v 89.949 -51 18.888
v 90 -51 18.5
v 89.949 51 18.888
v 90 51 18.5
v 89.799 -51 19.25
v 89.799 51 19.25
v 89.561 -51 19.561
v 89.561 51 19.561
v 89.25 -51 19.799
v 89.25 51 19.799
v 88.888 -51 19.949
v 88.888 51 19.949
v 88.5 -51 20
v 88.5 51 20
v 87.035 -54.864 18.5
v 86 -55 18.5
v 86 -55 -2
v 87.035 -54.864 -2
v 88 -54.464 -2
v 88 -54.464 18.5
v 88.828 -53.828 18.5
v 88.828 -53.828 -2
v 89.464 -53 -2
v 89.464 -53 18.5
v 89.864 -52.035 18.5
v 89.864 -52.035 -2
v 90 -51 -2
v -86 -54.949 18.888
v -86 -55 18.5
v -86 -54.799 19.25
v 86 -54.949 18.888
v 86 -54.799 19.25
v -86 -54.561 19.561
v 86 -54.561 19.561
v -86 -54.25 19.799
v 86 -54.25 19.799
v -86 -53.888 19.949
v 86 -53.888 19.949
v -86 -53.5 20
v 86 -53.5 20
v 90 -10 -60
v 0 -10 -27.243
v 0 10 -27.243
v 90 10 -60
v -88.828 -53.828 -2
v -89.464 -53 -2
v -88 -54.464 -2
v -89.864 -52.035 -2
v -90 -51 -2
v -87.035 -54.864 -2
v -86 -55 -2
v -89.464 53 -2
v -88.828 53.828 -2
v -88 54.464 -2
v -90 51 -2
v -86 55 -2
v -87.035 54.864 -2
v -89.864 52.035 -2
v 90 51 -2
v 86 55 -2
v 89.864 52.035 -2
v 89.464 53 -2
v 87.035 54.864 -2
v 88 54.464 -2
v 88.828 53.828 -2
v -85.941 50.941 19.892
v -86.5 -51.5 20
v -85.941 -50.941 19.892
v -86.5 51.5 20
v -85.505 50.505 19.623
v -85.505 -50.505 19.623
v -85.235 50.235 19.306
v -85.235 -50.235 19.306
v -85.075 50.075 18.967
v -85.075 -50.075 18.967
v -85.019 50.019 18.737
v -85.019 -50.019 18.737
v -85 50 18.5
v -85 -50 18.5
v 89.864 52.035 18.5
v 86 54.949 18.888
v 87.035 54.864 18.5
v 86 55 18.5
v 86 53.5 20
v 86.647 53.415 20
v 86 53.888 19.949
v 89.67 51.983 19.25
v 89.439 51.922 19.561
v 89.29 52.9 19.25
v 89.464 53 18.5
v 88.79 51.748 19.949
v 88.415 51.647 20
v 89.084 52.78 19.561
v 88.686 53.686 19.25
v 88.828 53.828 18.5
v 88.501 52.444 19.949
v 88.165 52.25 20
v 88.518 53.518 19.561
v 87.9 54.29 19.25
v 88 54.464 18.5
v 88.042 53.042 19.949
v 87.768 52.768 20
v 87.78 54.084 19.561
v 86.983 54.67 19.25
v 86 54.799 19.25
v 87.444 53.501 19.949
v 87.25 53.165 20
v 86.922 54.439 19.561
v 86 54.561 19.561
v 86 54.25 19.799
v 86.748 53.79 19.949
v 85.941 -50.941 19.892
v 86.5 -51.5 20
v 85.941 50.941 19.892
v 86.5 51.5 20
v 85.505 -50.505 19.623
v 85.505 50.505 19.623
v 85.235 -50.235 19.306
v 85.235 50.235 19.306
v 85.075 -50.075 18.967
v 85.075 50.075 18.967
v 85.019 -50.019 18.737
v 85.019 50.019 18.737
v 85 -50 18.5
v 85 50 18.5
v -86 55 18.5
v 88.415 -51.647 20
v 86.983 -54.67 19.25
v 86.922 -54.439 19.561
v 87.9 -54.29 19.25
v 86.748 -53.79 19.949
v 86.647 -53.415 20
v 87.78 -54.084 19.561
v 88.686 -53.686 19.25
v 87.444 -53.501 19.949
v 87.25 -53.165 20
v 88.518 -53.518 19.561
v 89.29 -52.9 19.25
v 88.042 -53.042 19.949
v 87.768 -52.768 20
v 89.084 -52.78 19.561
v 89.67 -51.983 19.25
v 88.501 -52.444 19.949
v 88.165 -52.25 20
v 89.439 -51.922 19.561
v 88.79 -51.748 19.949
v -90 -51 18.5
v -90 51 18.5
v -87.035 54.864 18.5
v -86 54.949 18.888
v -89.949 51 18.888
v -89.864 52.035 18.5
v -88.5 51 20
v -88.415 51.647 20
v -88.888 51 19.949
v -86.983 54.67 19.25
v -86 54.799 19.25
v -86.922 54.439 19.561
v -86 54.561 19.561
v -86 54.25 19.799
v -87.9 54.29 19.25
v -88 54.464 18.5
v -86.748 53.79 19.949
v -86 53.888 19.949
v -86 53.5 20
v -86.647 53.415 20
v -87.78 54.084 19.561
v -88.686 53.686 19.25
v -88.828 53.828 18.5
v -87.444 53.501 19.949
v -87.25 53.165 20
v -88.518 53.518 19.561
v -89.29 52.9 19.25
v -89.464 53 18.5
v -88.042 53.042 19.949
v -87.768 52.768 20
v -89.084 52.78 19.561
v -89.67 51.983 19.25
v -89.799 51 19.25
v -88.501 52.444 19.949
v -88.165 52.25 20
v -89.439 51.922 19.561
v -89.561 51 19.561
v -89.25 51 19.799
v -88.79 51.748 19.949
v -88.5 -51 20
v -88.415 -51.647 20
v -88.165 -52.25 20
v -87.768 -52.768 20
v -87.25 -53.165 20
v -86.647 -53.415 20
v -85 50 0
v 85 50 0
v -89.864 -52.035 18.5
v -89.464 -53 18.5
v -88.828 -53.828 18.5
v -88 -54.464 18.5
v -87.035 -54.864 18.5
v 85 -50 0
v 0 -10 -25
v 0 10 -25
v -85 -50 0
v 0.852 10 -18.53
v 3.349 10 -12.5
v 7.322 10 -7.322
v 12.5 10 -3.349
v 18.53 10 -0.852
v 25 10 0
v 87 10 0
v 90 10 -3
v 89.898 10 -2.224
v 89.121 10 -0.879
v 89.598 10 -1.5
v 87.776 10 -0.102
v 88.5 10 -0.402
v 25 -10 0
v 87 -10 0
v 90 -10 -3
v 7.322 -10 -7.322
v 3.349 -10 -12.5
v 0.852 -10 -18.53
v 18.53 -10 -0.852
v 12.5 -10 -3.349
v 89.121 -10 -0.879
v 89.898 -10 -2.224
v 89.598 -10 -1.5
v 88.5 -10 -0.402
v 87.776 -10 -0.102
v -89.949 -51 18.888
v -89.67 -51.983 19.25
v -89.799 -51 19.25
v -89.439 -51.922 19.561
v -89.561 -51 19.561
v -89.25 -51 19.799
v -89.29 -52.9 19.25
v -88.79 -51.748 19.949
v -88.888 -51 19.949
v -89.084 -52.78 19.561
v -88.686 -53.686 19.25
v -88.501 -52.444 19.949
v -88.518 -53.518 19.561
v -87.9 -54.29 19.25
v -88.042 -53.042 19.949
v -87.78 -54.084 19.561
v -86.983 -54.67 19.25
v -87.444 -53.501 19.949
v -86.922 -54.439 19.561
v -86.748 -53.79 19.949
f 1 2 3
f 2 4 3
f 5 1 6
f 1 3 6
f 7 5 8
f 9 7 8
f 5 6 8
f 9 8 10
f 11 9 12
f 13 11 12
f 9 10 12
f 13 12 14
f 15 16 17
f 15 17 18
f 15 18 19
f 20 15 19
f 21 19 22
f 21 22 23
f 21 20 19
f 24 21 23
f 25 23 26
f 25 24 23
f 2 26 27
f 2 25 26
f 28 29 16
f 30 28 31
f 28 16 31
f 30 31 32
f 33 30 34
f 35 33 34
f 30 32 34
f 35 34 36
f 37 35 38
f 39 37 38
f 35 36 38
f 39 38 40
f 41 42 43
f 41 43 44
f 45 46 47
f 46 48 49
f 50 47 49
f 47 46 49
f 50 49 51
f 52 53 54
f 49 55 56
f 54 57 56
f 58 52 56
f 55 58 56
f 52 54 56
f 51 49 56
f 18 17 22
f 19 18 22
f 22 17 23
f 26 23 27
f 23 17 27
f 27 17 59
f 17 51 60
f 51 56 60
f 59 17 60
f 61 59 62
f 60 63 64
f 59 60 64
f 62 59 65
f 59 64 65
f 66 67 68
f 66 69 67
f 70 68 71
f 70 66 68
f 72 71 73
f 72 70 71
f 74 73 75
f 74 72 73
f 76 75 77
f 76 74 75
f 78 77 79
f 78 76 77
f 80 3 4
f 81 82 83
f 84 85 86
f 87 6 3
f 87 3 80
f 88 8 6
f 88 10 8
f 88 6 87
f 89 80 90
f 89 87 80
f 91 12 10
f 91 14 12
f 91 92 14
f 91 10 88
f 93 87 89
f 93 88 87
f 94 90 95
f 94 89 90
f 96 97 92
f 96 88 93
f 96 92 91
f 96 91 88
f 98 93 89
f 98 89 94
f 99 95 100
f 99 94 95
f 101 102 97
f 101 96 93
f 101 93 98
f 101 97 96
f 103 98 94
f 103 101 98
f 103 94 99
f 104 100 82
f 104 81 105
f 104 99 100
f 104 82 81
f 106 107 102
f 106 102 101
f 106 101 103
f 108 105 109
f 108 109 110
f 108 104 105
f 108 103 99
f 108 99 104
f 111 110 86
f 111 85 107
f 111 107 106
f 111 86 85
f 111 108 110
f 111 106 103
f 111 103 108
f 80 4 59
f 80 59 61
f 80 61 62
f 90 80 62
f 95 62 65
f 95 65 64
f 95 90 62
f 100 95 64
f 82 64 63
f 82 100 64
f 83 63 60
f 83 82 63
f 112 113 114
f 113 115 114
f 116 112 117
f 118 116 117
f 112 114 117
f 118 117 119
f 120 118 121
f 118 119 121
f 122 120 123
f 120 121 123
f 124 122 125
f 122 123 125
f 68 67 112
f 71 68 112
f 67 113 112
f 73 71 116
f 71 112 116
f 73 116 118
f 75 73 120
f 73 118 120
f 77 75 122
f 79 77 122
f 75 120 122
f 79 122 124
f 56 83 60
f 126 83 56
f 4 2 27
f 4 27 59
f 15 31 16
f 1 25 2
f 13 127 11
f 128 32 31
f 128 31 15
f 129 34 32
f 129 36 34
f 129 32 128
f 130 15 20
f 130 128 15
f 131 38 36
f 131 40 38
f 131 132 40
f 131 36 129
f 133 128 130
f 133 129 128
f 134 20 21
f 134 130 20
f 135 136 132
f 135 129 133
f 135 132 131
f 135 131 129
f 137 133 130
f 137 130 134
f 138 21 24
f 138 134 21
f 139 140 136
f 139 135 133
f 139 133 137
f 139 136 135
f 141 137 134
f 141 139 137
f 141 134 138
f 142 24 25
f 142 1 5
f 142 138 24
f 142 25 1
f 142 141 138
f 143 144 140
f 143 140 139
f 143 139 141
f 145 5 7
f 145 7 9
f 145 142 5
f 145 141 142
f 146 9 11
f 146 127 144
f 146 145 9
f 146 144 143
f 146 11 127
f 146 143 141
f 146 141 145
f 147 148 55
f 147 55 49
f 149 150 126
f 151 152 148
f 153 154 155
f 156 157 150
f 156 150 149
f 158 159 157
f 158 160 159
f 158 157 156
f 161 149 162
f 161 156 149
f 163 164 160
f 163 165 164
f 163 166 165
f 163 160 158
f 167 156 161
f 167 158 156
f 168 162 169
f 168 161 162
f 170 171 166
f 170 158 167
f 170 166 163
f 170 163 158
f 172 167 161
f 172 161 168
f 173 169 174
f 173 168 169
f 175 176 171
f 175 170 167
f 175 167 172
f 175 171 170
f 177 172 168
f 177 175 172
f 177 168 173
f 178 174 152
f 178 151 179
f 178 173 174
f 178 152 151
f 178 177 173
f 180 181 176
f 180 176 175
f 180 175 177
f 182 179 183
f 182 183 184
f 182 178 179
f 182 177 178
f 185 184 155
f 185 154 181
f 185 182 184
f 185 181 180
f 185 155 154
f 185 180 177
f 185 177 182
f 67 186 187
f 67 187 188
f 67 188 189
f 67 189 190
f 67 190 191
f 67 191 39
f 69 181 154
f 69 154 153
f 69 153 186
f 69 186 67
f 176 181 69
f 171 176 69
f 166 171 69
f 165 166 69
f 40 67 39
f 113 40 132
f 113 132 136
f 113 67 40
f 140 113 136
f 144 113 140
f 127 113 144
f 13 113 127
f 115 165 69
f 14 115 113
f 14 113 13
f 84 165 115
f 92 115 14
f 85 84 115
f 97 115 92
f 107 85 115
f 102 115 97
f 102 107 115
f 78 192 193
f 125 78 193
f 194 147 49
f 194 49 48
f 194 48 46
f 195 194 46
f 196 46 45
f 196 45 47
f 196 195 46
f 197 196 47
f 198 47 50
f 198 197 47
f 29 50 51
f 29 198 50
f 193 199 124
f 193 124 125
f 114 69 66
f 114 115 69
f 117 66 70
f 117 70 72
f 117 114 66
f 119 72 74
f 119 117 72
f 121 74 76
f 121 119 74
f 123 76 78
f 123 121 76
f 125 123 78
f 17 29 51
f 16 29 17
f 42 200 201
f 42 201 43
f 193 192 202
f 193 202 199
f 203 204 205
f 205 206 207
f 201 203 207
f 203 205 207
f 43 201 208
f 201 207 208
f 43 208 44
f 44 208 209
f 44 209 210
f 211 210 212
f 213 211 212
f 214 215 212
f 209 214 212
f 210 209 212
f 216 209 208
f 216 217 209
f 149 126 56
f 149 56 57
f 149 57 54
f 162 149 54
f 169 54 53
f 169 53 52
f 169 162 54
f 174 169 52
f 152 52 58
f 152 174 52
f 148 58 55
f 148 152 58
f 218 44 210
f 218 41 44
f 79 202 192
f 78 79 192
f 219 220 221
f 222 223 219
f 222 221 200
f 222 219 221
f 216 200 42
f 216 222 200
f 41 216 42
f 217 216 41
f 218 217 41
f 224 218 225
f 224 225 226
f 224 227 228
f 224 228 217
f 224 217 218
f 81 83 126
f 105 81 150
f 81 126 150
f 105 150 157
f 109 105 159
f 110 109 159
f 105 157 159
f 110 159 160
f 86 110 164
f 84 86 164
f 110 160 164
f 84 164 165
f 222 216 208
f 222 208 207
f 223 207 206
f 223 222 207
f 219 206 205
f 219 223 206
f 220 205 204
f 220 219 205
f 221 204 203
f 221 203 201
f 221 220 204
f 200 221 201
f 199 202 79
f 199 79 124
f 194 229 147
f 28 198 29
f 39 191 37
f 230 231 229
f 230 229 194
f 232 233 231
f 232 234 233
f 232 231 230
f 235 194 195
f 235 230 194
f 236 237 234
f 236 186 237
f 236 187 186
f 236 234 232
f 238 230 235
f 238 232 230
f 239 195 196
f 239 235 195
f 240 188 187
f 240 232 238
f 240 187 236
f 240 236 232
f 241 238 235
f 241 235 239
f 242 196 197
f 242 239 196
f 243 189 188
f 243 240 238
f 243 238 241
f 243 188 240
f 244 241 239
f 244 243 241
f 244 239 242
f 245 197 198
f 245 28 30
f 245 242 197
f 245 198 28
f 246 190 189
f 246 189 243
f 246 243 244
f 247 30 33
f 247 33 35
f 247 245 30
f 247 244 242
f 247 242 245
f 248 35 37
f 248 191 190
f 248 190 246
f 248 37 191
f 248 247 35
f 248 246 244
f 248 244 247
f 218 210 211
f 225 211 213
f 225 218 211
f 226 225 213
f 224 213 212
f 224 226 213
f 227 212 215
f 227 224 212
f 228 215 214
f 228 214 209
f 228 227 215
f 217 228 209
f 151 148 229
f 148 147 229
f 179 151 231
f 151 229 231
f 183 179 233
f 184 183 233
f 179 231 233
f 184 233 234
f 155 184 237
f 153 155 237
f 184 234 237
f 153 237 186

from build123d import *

# Parameters (mm, degrees)
F0_W     = 170
F0_H     = 100
F1_DEPTH = 20
F2_DEPTH = 2
F3_R     = 1.5
F5_DEPTH = 10


with BuildPart() as f1:
    # F0 (on Top) → F1 (new body)
    with BuildSketch(Plane.XY):
        with BuildLine():
            Line((-90.000004, 51.000004), (-90.000004, -51.000004))
            ThreePointArc((-90.000004, -51.000004), (-88.828431, -53.828431), (-86.000004, -55.000004))
            Line((-86.000004, -55.000004), (86.000004, -55.000004))
            ThreePointArc((86.000004, -55.000004), (88.828431, -53.828431), (90.000004, -51.000004))
            Line((90.000004, -51.000004), (90.000004, 51.000004))
            ThreePointArc((90.000004, 51.000004), (88.828431, 53.828431), (86.000004, 55.000004))
            Line((86.000004, 55.000004), (-86.000004, 55.000004))
            ThreePointArc((-86.000004, 55.000004), (-88.828431, 53.828431), (-90.000004, 51.000004))
        make_face()
        Rectangle(F0_W, F0_H, mode=Mode.SUBTRACT)
    extrude(amount=F1_DEPTH)

    # F0 (on Top) → F2 (join)
    with BuildSketch(Plane.XY):
        with BuildLine():
            Line((-90.000004, 51.000004), (-90.000004, -51.000004))
            ThreePointArc((-90.000004, -51.000004), (-88.828431, -53.828431), (-86.000004, -55.000004))
            Line((-86.000004, -55.000004), (86.000004, -55.000004))
            ThreePointArc((86.000004, -55.000004), (88.828431, -53.828431), (90.000004, -51.000004))
            Line((90.000004, -51.000004), (90.000004, 51.000004))
            ThreePointArc((90.000004, 51.000004), (88.828431, 53.828431), (86.000004, 55.000004))
            Line((86.000004, 55.000004), (-86.000004, 55.000004))
            ThreePointArc((-86.000004, 55.000004), (-88.828431, 53.828431), (-90.000004, 51.000004))
        make_face()
        Rectangle(F0_W, F0_H, mode=Mode.SUBTRACT)
        Rectangle(F0_W, F0_H)
    extrude(amount=-F2_DEPTH)

    # F3
    f3_edges = [f1.edges().sort_by_distance(p)[0] for p in [
        (0, -55.000004, 20),
        (0, -50, 20),
        (-85, 0, 20),
        (-90.000004, 0, 20),
        (0, 50, 20),
        (0, 55.000004, 20),
        (90.000004, 0, 20),
        (85, 0, 20),
    ]]
    fillet(f3_edges, radius=F3_R)


with BuildPart() as f5:
    # F4 (on Front) → F5 (new body, symmetric)
    with BuildSketch(Plane.XZ):
        with BuildLine():
            Line((87, 0), (25, 0))
            ThreePointArc((25, 0), (7.32233, -7.32233), (0, -25))
            Line((0, -25), (0, -27.242679))
            Line((0, -27.242679), (90, -60))
            Line((90, -60), (90, -3))
            ThreePointArc((90, -3), (89.12132, -0.87868), (87, 0))
        make_face()
    extrude(amount=F5_DEPTH, both=True)


solid = Compound([f1.part, f5.part])
